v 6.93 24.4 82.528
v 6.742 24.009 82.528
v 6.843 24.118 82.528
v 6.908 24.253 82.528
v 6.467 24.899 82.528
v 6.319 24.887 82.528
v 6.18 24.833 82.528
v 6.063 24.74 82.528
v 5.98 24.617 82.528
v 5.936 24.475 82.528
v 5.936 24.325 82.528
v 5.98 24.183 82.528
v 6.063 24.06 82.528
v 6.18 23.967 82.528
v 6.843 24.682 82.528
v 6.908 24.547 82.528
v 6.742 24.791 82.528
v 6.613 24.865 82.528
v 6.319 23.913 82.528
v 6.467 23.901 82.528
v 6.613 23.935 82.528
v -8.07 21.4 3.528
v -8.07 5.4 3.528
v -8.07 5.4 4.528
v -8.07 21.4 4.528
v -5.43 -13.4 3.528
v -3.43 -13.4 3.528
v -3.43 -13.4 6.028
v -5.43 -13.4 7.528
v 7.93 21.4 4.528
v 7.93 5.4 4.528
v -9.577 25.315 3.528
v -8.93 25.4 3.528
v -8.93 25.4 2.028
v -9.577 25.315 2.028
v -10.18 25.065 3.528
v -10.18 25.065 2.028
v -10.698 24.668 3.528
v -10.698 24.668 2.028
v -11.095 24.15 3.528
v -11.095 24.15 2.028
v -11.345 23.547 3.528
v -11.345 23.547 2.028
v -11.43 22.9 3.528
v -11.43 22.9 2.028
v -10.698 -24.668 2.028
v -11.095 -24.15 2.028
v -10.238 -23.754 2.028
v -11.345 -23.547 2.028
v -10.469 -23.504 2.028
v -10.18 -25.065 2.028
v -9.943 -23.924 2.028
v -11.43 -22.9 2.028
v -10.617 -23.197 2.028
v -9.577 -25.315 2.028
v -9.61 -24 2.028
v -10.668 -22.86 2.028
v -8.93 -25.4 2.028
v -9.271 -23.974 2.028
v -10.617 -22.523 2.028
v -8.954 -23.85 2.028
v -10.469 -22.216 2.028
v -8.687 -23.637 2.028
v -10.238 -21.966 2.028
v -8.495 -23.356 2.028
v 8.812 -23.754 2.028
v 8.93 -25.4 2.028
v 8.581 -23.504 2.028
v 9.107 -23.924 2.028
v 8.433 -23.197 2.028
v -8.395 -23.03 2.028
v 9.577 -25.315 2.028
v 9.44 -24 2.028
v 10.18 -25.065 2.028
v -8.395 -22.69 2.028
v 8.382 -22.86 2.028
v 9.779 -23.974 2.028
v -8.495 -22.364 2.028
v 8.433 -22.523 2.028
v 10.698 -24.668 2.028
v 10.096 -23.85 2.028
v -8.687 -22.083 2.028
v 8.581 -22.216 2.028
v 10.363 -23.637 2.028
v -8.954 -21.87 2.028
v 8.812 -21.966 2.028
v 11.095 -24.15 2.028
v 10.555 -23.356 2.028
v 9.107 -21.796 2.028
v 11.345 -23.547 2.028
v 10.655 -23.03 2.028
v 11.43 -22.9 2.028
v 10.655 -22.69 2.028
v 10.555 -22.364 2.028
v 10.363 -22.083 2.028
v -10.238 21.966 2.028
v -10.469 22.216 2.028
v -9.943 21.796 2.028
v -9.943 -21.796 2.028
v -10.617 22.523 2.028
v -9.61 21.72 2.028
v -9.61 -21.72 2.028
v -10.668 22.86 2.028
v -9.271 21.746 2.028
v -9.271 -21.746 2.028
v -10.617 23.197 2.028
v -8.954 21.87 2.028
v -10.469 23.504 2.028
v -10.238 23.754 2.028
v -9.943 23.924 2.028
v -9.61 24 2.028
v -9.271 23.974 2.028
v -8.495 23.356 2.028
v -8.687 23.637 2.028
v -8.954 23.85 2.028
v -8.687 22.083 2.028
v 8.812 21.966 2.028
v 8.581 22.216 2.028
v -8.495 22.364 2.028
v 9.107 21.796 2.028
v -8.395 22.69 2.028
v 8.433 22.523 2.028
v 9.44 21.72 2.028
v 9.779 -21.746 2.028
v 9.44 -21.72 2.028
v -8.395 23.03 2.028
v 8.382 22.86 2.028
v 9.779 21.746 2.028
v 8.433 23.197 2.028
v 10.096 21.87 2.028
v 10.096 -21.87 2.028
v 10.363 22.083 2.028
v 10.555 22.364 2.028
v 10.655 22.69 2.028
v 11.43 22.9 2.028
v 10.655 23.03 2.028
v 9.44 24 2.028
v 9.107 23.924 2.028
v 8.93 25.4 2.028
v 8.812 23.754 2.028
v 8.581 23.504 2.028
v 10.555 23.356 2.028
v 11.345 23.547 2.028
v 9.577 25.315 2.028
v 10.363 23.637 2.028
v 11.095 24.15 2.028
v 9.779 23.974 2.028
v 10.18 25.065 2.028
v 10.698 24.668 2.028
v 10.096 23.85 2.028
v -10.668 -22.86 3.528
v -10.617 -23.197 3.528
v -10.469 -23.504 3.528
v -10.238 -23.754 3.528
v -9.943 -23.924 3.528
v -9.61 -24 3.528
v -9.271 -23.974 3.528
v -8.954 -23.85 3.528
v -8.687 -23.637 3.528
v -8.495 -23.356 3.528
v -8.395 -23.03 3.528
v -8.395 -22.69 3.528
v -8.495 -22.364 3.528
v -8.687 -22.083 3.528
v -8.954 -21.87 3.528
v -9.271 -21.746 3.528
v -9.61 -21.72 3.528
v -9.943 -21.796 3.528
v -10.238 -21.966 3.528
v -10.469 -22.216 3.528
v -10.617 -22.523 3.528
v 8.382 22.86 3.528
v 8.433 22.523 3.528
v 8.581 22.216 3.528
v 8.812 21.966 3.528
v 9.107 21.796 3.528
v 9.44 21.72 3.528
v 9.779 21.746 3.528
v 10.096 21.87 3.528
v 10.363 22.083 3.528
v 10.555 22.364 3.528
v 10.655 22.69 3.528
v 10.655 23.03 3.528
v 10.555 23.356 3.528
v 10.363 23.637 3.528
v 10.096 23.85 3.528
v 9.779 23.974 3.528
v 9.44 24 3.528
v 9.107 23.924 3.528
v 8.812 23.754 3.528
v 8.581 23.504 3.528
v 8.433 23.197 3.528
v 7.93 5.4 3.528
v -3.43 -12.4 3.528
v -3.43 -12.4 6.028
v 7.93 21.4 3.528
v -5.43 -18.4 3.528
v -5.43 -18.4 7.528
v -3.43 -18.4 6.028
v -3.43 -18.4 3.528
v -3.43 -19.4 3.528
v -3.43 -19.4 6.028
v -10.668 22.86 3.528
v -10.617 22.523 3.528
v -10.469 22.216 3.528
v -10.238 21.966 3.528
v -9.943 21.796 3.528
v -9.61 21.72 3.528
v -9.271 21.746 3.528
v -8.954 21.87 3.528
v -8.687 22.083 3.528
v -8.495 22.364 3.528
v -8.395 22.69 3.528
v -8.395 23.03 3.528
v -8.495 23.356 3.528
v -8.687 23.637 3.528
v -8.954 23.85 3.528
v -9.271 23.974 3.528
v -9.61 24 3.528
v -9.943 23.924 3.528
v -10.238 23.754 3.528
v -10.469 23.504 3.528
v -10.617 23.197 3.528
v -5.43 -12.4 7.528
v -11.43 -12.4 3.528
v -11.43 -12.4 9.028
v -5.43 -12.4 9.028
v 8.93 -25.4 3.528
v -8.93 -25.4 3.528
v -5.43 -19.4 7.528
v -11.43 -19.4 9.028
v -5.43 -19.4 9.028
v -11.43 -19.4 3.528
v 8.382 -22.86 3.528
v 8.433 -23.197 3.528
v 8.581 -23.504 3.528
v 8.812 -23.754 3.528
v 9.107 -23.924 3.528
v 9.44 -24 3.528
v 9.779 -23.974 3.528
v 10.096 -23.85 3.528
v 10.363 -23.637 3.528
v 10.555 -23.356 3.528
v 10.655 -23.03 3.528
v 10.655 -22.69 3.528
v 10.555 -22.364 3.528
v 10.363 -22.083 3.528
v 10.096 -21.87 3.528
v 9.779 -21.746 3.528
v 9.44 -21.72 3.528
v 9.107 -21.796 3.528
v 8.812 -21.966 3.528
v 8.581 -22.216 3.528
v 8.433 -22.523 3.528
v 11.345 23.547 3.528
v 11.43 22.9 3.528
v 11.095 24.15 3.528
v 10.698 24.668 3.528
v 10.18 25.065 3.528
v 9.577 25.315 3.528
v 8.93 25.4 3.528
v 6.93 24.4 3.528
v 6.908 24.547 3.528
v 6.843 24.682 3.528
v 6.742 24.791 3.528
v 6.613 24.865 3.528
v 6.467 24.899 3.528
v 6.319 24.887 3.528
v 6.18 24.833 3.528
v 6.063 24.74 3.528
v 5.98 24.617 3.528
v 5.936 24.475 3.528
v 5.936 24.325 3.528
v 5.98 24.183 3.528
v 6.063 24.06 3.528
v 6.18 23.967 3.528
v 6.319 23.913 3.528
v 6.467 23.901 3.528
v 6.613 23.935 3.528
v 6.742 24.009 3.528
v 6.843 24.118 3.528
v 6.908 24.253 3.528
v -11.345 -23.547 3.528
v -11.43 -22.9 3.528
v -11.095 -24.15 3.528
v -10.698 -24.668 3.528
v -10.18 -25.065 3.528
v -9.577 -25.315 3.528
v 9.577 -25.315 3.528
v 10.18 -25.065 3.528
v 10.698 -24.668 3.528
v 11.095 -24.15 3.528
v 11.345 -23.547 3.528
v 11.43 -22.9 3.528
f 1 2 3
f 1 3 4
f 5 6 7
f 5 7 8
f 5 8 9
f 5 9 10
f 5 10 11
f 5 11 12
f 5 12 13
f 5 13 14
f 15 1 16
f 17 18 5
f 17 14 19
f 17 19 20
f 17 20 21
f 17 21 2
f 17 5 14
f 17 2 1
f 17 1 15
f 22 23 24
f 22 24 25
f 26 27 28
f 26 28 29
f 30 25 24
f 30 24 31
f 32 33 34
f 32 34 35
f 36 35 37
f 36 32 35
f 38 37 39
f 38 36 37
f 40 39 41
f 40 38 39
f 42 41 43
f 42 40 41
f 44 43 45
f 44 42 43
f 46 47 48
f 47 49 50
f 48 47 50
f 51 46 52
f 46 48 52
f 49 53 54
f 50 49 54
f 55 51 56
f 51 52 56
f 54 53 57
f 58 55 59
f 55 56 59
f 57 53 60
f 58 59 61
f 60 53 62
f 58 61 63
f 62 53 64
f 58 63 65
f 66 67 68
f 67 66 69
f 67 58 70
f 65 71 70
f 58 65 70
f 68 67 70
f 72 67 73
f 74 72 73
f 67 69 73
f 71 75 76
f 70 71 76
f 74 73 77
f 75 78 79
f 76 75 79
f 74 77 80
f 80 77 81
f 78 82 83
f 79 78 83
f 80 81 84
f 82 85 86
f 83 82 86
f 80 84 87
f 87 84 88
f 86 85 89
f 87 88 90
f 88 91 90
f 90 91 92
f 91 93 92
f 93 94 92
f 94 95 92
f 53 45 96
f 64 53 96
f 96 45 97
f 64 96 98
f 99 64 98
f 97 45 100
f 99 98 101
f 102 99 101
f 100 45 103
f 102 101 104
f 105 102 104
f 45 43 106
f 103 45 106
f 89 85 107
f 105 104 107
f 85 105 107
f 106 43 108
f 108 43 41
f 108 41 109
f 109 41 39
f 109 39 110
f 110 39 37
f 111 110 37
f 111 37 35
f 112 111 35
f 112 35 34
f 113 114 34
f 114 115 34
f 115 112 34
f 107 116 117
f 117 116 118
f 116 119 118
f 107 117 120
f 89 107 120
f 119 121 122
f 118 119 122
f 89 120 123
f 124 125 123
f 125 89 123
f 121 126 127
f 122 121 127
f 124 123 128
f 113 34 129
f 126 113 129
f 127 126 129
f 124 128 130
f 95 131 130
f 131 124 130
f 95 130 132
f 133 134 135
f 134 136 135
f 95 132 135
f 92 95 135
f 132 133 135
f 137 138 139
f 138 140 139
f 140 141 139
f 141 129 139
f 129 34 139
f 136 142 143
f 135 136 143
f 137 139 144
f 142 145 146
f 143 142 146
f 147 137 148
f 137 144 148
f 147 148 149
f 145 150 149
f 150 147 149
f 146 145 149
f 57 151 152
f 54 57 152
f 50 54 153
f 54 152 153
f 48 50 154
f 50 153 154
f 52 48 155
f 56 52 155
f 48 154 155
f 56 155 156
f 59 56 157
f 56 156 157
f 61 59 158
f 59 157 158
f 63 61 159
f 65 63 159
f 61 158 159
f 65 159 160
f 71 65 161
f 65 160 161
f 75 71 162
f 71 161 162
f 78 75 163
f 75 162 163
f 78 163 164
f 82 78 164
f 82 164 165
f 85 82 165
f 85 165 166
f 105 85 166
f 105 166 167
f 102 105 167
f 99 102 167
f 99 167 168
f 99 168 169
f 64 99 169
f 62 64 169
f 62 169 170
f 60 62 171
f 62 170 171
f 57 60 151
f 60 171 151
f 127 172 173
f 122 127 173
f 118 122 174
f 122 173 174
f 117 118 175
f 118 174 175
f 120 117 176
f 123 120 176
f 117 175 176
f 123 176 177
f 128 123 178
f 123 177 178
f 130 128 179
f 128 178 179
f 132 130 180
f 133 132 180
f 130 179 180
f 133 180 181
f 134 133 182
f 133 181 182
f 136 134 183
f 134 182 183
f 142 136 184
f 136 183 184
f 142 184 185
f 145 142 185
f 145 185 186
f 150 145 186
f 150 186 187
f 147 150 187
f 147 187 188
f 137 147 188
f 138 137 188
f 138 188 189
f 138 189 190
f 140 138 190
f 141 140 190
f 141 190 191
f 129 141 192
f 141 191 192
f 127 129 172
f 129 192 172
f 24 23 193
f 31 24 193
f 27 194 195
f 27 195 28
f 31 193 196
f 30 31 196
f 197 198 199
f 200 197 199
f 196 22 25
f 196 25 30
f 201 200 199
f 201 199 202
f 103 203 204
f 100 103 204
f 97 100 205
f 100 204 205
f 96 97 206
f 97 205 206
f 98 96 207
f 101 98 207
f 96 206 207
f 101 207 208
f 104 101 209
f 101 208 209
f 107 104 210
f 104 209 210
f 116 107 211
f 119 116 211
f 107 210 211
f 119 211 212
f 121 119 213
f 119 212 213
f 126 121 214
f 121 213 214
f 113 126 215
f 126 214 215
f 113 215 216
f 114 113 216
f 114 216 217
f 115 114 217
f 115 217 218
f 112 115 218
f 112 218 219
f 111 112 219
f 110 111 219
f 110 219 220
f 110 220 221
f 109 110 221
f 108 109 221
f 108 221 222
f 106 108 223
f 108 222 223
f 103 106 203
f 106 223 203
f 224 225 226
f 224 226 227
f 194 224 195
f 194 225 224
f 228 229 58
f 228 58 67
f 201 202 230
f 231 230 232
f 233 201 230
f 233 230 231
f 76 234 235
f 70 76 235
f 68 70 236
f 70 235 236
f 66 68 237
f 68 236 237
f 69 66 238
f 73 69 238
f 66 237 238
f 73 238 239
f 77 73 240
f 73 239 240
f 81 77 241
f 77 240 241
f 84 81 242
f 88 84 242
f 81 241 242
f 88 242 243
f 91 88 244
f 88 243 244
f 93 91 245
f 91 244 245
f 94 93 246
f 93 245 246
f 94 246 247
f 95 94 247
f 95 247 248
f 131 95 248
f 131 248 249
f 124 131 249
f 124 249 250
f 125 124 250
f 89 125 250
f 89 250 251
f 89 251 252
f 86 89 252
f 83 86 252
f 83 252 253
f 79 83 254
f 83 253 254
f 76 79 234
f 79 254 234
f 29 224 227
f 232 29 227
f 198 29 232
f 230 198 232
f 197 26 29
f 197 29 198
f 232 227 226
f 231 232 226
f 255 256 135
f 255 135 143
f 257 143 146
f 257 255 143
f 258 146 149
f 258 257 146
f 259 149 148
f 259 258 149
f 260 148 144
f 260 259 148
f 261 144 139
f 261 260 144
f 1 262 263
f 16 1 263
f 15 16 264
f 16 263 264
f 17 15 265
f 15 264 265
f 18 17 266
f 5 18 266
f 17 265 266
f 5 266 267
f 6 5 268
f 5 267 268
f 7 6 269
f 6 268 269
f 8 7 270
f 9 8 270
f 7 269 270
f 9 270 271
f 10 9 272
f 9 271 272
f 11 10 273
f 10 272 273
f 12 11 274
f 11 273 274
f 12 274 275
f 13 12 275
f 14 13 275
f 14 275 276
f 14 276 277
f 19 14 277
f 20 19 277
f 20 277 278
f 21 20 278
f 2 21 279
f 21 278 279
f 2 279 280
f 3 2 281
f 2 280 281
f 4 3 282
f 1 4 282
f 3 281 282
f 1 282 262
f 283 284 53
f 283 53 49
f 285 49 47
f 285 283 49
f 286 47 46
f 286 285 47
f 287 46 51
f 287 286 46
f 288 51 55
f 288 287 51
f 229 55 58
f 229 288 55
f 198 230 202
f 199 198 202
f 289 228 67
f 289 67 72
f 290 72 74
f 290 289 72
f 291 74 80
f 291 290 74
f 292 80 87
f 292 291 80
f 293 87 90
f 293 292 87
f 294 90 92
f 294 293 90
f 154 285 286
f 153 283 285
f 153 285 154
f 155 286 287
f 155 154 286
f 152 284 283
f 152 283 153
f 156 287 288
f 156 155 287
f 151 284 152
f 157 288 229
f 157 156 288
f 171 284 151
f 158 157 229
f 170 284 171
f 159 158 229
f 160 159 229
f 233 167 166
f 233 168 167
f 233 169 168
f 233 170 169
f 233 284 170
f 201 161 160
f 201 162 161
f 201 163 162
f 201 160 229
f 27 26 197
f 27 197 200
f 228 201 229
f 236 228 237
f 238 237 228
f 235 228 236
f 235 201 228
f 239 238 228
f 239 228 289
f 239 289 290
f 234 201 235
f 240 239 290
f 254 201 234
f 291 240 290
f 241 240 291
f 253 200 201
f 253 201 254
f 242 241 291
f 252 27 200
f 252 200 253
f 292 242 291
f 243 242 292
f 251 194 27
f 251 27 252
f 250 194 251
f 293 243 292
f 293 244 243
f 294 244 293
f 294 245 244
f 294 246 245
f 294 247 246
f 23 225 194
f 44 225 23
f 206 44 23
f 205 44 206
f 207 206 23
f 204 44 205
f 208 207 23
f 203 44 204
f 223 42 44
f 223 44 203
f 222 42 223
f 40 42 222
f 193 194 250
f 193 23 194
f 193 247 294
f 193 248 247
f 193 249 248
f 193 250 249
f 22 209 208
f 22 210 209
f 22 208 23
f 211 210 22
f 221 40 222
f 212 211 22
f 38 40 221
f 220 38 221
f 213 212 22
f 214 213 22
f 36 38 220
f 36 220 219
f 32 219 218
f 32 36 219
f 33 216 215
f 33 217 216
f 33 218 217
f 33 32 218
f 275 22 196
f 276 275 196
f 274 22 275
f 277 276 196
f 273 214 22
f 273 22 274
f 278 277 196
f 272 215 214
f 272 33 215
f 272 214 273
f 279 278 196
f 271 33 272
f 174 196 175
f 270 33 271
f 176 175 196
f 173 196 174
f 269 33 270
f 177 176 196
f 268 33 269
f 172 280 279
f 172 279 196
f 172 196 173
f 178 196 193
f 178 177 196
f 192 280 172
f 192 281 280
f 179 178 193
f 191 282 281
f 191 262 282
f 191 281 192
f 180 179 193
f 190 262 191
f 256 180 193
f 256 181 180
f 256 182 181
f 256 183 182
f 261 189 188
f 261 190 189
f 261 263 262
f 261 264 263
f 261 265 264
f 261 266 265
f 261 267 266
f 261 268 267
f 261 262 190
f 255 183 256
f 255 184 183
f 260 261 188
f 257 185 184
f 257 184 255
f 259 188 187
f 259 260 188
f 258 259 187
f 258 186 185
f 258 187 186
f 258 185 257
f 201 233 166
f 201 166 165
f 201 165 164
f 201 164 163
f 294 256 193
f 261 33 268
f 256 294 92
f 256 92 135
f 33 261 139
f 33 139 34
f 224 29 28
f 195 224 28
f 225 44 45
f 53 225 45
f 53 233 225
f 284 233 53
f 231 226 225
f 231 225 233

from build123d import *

# Parameters (mm, degrees)
SKETCH1_R               = 1.143
BOSS_EXTRUDE1_DEPTH     = 1.5
CROQUIS1_W              = 16
CROQUIS1_H              = 16
SALIENTE_EXTRUIR1_DEPTH = 1
CROQUIS2_R              = 0.5
SALIENTE_EXTRUIR2_DEPTH = 79
SALIENTE_EXTRUIR3_DEPTH = 5.5
CORTAR_EXTRUIR1_DEPTH   = 95.596612016


with BuildPart() as part:
    # Sketch1 → Boss-Extrude1 (new body)
    with BuildSketch(Plane.XY.offset(3.527777778)):
        with BuildLine():
            Line((-11.43, 22.9), (-11.43, -22.9))
            ThreePointArc((-11.43, -22.9), (-10.697766953, -24.667766953), (-8.93, -25.4))
            Line((-8.93, -25.4), (8.93, -25.4))
            ThreePointArc((8.93, -25.4), (10.697766953, -24.667766953), (11.43, -22.9))
            Line((11.43, -22.9), (11.43, 22.9))
            ThreePointArc((11.43, 22.9), (10.697766953, 24.667766953), (8.93, 25.4))
            Line((8.93, 25.4), (-8.93, 25.4))
            ThreePointArc((-8.93, 25.4), (-10.697766953, 24.667766953), (-11.43, 22.9))
        make_face()
        with Locations(Location((9.525, 22.86, 0), (0, 0, 180))):
            Circle(SKETCH1_R, mode=Mode.SUBTRACT)
        with Locations(Location((-9.525, 22.86, 0), (0, 0, 180))):
            Circle(SKETCH1_R, mode=Mode.SUBTRACT)
        with Locations(Location((-9.525, -22.86, 0), (0, 0, 180))):
            Circle(SKETCH1_R, mode=Mode.SUBTRACT)
        with Locations(Location((9.525, -22.86, 0), (0, 0, 180))):
            Circle(SKETCH1_R, mode=Mode.SUBTRACT)
    extrude(amount=-BOSS_EXTRUDE1_DEPTH)

    # Croquis1 → Saliente-Extruir1 (add)
    with BuildSketch(Plane.XY.offset(3.527777778)):
        with Locations((-0.07, 13.4)):
            Rectangle(CROQUIS1_W, CROQUIS1_H)
    extrude(amount=SALIENTE_EXTRUIR1_DEPTH)

    # Croquis2 → Saliente-Extruir2 (add)
    with BuildSketch(Plane.XY.offset(3.527777778)):
        with Locations((6.43, 24.4)):
            Circle(CROQUIS2_R)
    extrude(amount=SALIENTE_EXTRUIR2_DEPTH)

    # Croquis3 → Saliente-Extruir3 (add)
    with BuildSketch(Plane.XY.offset(3.527777778)):
        Polygon((-11.43, -12.4), (-3.43, -12.4), (-3.43, -13.4), (-5.43, -13.4), (-5.43, -18.4), (-3.43, -18.4), (-3.43, -19.4), (-11.43, -19.4), align=None)
    extrude(amount=SALIENTE_EXTRUIR3_DEPTH)

    # Croquis4 → Cortar-Extruir1 (cut, through all)
    with BuildSketch(Plane.XZ.offset(19.4)):
        Polygon((-5.43, 9.027777778), (-5.43, 7.527777778), (-3.43, 6.027777778), (-3.43, 9.027777778), align=None)
    extrude(amount=-CORTAR_EXTRUIR1_DEPTH, mode=Mode.SUBTRACT)


solid = part.part
